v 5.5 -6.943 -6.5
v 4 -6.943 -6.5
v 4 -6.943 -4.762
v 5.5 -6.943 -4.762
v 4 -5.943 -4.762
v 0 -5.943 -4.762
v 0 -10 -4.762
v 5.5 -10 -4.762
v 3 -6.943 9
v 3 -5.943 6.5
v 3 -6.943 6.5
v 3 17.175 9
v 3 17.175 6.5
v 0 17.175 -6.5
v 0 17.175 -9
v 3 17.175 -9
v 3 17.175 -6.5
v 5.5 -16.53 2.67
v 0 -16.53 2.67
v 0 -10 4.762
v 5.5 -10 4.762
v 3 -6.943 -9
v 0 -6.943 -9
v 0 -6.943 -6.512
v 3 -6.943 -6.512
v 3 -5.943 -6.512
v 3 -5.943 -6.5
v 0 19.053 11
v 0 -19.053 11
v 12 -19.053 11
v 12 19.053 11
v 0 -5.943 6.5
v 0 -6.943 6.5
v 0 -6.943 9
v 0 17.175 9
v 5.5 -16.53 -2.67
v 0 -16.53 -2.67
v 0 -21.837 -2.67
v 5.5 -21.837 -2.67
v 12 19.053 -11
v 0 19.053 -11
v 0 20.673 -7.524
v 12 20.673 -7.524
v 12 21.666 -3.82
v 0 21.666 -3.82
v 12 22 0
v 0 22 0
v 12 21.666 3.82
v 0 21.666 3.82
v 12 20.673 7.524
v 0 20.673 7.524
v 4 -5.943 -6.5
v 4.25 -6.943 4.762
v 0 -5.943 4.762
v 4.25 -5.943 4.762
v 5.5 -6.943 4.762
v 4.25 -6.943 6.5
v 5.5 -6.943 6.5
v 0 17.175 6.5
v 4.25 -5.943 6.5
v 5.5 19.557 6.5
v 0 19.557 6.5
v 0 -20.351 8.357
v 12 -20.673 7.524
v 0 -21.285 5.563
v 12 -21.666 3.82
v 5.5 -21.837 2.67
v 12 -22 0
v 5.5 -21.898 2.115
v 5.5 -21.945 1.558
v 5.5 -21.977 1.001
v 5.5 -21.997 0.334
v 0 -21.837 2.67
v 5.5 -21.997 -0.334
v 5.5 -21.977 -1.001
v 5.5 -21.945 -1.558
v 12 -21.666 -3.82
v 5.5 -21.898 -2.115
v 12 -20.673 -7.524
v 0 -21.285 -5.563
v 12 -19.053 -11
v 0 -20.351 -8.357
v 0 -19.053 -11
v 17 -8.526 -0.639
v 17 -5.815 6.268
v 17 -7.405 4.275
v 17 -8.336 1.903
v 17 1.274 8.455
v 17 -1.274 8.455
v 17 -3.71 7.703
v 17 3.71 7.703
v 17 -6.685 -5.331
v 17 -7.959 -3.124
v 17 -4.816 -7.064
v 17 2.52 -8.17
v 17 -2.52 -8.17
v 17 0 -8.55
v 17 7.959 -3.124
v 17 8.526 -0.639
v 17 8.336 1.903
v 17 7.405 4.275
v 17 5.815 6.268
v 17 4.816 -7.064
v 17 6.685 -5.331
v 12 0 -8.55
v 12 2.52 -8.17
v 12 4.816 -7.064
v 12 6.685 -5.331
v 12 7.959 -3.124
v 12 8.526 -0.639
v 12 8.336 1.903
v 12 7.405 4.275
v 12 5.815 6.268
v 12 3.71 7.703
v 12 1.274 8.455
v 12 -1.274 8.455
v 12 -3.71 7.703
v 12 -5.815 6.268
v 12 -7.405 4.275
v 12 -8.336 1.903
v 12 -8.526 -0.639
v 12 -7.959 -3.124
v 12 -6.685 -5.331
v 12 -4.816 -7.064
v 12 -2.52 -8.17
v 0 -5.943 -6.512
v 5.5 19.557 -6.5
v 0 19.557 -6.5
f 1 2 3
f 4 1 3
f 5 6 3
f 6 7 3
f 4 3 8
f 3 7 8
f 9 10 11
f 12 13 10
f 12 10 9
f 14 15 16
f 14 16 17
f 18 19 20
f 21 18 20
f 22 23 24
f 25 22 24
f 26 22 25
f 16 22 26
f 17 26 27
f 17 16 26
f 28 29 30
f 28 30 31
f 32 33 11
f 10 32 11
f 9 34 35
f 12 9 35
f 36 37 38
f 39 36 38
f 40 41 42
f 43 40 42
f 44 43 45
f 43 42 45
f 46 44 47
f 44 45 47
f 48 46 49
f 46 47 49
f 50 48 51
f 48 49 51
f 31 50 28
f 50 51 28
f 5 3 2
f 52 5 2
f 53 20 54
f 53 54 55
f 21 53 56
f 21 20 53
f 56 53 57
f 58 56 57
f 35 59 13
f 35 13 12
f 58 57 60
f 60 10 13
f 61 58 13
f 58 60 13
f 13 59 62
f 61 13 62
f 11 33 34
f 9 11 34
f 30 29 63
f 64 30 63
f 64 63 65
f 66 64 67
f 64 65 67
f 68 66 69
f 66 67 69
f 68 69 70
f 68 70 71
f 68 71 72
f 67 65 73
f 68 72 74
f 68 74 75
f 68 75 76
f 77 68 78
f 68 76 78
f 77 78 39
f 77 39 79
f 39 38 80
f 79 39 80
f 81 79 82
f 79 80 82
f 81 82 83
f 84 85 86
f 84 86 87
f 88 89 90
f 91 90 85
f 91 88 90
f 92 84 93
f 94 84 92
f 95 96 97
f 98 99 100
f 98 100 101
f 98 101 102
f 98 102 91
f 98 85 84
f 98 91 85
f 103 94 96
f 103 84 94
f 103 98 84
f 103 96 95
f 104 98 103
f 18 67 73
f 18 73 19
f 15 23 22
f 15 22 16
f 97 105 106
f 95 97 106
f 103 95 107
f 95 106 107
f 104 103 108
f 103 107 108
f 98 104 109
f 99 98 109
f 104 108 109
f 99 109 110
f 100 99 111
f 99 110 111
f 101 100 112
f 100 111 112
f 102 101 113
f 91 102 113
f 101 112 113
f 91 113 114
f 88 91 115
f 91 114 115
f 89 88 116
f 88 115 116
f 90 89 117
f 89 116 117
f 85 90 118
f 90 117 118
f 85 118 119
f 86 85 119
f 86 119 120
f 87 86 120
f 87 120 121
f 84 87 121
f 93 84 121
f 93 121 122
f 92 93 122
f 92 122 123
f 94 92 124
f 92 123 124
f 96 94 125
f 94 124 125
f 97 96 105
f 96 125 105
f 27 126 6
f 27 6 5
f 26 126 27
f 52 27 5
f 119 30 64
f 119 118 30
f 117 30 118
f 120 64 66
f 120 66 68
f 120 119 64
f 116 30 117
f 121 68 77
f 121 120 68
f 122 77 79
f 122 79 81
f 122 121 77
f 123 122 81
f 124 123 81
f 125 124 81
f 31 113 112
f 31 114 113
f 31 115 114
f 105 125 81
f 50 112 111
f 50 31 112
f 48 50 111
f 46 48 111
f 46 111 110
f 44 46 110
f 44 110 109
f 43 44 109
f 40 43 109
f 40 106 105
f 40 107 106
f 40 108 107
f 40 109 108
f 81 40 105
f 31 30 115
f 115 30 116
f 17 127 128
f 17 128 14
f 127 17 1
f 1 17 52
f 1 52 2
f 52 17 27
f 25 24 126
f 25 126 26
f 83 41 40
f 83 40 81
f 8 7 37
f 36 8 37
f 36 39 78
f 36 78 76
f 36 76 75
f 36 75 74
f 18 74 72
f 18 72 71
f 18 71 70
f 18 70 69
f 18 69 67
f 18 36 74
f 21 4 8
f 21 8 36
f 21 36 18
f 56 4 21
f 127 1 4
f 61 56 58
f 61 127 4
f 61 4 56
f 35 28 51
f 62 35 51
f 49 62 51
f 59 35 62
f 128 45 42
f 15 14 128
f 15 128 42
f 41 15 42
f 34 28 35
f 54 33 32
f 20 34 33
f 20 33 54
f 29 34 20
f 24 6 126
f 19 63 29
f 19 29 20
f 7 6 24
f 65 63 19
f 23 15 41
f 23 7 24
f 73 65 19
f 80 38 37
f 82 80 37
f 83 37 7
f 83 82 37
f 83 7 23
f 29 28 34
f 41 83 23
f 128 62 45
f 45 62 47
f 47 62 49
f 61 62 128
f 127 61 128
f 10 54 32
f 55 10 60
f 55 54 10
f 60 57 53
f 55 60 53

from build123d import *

# Parameters (mm, degrees)
SKETCH1_R           = 22
BOSS_EXTRUDE1_DEPTH = 12
CUT_EXTRUDE2_DEPTH  = 5.5
SKETCH15_W          = 18
SKETCH15_H          = 24.118038922
CUT_EXTRUDE3_DEPTH  = 3
SKETCH16_R          = 8.55
BOSS_EXTRUDE2_DEPTH = 5
SKETCH17_W          = 4
SKETCH17_H          = 1.75
BOSS_EXTRUDE3_DEPTH = 1
SKETCH18_W          = 4.25
SKETCH18_H          = 1.737607108
BOSS_EXTRUDE4_DEPTH = 1
CUT_EXTRUDE4_DEPTH  = 12


# Read off the part's stored shape, not the designer's step: Cut-Extrude4
with BuildPart() as part:
    # Sketch1 → Boss-Extrude1 (new body)
    with BuildSketch(Plane(origin=(0, 0, 0), x_dir=(0, 0, -1), z_dir=(1, 0, 0))):
        Circle(SKETCH1_R)
    extrude(amount=BOSS_EXTRUDE1_DEPTH)

    # Sketch13 → Cut-Extrude2 (cut)
    with BuildSketch(Plane(origin=(0, 0, 0), x_dir=(0, 0, -1), z_dir=(1, 0, 0))):
        with BuildLine():
            Line((-2.670420152, -16.85816067), (-2.670420152, -16.530371213))
            Line((-2.670420152, -16.530371213), (-4.762392892, -10))
            Line((-4.762392892, -10), (-4.762392892, -6.943148259))
            Line((-4.762392892, -6.943148259), (-6.5, -6.943148259))
            Line((-6.5, -6.943148259), (-6.5, 19.556851741))
            Line((-6.5, 19.556851741), (6.5, 19.556851741))
            Line((6.5, 19.556851741), (6.5, -6.943148259))
            Line((6.5, -6.943148259), (4.762392892, -6.943148259))
            Line((4.762392892, -6.943148259), (4.762392892, -10))
            Line((4.762392892, -10), (2.670420152, -16.530371213))
            Line((2.670420152, -16.530371213), (2.670420152, -16.85816067))
            Line((2.670420152, -16.85816067), (2.670420152, -21.837327131))
            ThreePointArc((2.670420152, -21.837327131), (1.836835043, -21.92318492), (1.000584871, -21.977234355))
            Line((1.000584871, -21.977234355), (0, -25.25))
            Line((0, -25.25), (-1.000584871, -21.977234355))
            ThreePointArc((-1.000584871, -21.977234355), (-1.836835043, -21.92318492), (-2.670420152, -21.837327131))
            Line((-2.670420152, -21.837327131), (-2.670420152, -16.85816067))
        make_face()
    extrude(amount=CUT_EXTRUDE2_DEPTH, mode=Mode.SUBTRACT)

    # Sketch15 → Cut-Extrude3 (cut)
    with BuildSketch(Plane.ZY):
        with Locations((0, 5.115871202)):
            Rectangle(SKETCH15_W, SKETCH15_H)
    extrude(amount=-CUT_EXTRUDE3_DEPTH, mode=Mode.SUBTRACT)

    # Sketch16 → Boss-Extrude2 (add)
    with BuildSketch(Plane(origin=(12, 0, 0), x_dir=(0, 0, -1), z_dir=(1, 0, 0))):
        Circle(SKETCH16_R)
    extrude(amount=BOSS_EXTRUDE2_DEPTH)

    # Sketch17 → Boss-Extrude3 (add)
    with BuildSketch(Plane(origin=(0, -6.943148259, 0), x_dir=(1, 0, 0), z_dir=(0, 1, 0))):
        with Locations((2, 5.637392892)):
            Rectangle(SKETCH17_W, SKETCH17_H)
    extrude(amount=BOSS_EXTRUDE3_DEPTH)

    # Sketch18 → Boss-Extrude4 (add)
    with BuildSketch(Plane(origin=(0, -6.943148259, 0), x_dir=(1, 0, 0), z_dir=(0, 1, 0))):
        with Locations((2.125, -5.631196446)):
            Rectangle(SKETCH18_W, SKETCH18_H)
    extrude(amount=BOSS_EXTRUDE4_DEPTH)

    # Cut-Extrude4 outline → Cut-Extrude4 (cut)
    with BuildSketch(Plane(origin=(0, 0, 0), x_dir=(0, 0, -1), z_dir=(1, 0, 0))):
        with BuildLine():
            ThreePointArc((11, -19.052558883), (22, 0), (11, 19.052558883))
            Line((11, 19.052558883), (11, -19.052558883))
        make_face()
        with BuildLine():
            Line((-11, -19.052558883), (-11, 19.052558883))
            ThreePointArc((-11, 19.052558883), (-22, 0), (-11, -19.052558883))
        make_face()
    extrude(amount=CUT_EXTRUDE4_DEPTH, mode=Mode.SUBTRACT)


solid = part.part
